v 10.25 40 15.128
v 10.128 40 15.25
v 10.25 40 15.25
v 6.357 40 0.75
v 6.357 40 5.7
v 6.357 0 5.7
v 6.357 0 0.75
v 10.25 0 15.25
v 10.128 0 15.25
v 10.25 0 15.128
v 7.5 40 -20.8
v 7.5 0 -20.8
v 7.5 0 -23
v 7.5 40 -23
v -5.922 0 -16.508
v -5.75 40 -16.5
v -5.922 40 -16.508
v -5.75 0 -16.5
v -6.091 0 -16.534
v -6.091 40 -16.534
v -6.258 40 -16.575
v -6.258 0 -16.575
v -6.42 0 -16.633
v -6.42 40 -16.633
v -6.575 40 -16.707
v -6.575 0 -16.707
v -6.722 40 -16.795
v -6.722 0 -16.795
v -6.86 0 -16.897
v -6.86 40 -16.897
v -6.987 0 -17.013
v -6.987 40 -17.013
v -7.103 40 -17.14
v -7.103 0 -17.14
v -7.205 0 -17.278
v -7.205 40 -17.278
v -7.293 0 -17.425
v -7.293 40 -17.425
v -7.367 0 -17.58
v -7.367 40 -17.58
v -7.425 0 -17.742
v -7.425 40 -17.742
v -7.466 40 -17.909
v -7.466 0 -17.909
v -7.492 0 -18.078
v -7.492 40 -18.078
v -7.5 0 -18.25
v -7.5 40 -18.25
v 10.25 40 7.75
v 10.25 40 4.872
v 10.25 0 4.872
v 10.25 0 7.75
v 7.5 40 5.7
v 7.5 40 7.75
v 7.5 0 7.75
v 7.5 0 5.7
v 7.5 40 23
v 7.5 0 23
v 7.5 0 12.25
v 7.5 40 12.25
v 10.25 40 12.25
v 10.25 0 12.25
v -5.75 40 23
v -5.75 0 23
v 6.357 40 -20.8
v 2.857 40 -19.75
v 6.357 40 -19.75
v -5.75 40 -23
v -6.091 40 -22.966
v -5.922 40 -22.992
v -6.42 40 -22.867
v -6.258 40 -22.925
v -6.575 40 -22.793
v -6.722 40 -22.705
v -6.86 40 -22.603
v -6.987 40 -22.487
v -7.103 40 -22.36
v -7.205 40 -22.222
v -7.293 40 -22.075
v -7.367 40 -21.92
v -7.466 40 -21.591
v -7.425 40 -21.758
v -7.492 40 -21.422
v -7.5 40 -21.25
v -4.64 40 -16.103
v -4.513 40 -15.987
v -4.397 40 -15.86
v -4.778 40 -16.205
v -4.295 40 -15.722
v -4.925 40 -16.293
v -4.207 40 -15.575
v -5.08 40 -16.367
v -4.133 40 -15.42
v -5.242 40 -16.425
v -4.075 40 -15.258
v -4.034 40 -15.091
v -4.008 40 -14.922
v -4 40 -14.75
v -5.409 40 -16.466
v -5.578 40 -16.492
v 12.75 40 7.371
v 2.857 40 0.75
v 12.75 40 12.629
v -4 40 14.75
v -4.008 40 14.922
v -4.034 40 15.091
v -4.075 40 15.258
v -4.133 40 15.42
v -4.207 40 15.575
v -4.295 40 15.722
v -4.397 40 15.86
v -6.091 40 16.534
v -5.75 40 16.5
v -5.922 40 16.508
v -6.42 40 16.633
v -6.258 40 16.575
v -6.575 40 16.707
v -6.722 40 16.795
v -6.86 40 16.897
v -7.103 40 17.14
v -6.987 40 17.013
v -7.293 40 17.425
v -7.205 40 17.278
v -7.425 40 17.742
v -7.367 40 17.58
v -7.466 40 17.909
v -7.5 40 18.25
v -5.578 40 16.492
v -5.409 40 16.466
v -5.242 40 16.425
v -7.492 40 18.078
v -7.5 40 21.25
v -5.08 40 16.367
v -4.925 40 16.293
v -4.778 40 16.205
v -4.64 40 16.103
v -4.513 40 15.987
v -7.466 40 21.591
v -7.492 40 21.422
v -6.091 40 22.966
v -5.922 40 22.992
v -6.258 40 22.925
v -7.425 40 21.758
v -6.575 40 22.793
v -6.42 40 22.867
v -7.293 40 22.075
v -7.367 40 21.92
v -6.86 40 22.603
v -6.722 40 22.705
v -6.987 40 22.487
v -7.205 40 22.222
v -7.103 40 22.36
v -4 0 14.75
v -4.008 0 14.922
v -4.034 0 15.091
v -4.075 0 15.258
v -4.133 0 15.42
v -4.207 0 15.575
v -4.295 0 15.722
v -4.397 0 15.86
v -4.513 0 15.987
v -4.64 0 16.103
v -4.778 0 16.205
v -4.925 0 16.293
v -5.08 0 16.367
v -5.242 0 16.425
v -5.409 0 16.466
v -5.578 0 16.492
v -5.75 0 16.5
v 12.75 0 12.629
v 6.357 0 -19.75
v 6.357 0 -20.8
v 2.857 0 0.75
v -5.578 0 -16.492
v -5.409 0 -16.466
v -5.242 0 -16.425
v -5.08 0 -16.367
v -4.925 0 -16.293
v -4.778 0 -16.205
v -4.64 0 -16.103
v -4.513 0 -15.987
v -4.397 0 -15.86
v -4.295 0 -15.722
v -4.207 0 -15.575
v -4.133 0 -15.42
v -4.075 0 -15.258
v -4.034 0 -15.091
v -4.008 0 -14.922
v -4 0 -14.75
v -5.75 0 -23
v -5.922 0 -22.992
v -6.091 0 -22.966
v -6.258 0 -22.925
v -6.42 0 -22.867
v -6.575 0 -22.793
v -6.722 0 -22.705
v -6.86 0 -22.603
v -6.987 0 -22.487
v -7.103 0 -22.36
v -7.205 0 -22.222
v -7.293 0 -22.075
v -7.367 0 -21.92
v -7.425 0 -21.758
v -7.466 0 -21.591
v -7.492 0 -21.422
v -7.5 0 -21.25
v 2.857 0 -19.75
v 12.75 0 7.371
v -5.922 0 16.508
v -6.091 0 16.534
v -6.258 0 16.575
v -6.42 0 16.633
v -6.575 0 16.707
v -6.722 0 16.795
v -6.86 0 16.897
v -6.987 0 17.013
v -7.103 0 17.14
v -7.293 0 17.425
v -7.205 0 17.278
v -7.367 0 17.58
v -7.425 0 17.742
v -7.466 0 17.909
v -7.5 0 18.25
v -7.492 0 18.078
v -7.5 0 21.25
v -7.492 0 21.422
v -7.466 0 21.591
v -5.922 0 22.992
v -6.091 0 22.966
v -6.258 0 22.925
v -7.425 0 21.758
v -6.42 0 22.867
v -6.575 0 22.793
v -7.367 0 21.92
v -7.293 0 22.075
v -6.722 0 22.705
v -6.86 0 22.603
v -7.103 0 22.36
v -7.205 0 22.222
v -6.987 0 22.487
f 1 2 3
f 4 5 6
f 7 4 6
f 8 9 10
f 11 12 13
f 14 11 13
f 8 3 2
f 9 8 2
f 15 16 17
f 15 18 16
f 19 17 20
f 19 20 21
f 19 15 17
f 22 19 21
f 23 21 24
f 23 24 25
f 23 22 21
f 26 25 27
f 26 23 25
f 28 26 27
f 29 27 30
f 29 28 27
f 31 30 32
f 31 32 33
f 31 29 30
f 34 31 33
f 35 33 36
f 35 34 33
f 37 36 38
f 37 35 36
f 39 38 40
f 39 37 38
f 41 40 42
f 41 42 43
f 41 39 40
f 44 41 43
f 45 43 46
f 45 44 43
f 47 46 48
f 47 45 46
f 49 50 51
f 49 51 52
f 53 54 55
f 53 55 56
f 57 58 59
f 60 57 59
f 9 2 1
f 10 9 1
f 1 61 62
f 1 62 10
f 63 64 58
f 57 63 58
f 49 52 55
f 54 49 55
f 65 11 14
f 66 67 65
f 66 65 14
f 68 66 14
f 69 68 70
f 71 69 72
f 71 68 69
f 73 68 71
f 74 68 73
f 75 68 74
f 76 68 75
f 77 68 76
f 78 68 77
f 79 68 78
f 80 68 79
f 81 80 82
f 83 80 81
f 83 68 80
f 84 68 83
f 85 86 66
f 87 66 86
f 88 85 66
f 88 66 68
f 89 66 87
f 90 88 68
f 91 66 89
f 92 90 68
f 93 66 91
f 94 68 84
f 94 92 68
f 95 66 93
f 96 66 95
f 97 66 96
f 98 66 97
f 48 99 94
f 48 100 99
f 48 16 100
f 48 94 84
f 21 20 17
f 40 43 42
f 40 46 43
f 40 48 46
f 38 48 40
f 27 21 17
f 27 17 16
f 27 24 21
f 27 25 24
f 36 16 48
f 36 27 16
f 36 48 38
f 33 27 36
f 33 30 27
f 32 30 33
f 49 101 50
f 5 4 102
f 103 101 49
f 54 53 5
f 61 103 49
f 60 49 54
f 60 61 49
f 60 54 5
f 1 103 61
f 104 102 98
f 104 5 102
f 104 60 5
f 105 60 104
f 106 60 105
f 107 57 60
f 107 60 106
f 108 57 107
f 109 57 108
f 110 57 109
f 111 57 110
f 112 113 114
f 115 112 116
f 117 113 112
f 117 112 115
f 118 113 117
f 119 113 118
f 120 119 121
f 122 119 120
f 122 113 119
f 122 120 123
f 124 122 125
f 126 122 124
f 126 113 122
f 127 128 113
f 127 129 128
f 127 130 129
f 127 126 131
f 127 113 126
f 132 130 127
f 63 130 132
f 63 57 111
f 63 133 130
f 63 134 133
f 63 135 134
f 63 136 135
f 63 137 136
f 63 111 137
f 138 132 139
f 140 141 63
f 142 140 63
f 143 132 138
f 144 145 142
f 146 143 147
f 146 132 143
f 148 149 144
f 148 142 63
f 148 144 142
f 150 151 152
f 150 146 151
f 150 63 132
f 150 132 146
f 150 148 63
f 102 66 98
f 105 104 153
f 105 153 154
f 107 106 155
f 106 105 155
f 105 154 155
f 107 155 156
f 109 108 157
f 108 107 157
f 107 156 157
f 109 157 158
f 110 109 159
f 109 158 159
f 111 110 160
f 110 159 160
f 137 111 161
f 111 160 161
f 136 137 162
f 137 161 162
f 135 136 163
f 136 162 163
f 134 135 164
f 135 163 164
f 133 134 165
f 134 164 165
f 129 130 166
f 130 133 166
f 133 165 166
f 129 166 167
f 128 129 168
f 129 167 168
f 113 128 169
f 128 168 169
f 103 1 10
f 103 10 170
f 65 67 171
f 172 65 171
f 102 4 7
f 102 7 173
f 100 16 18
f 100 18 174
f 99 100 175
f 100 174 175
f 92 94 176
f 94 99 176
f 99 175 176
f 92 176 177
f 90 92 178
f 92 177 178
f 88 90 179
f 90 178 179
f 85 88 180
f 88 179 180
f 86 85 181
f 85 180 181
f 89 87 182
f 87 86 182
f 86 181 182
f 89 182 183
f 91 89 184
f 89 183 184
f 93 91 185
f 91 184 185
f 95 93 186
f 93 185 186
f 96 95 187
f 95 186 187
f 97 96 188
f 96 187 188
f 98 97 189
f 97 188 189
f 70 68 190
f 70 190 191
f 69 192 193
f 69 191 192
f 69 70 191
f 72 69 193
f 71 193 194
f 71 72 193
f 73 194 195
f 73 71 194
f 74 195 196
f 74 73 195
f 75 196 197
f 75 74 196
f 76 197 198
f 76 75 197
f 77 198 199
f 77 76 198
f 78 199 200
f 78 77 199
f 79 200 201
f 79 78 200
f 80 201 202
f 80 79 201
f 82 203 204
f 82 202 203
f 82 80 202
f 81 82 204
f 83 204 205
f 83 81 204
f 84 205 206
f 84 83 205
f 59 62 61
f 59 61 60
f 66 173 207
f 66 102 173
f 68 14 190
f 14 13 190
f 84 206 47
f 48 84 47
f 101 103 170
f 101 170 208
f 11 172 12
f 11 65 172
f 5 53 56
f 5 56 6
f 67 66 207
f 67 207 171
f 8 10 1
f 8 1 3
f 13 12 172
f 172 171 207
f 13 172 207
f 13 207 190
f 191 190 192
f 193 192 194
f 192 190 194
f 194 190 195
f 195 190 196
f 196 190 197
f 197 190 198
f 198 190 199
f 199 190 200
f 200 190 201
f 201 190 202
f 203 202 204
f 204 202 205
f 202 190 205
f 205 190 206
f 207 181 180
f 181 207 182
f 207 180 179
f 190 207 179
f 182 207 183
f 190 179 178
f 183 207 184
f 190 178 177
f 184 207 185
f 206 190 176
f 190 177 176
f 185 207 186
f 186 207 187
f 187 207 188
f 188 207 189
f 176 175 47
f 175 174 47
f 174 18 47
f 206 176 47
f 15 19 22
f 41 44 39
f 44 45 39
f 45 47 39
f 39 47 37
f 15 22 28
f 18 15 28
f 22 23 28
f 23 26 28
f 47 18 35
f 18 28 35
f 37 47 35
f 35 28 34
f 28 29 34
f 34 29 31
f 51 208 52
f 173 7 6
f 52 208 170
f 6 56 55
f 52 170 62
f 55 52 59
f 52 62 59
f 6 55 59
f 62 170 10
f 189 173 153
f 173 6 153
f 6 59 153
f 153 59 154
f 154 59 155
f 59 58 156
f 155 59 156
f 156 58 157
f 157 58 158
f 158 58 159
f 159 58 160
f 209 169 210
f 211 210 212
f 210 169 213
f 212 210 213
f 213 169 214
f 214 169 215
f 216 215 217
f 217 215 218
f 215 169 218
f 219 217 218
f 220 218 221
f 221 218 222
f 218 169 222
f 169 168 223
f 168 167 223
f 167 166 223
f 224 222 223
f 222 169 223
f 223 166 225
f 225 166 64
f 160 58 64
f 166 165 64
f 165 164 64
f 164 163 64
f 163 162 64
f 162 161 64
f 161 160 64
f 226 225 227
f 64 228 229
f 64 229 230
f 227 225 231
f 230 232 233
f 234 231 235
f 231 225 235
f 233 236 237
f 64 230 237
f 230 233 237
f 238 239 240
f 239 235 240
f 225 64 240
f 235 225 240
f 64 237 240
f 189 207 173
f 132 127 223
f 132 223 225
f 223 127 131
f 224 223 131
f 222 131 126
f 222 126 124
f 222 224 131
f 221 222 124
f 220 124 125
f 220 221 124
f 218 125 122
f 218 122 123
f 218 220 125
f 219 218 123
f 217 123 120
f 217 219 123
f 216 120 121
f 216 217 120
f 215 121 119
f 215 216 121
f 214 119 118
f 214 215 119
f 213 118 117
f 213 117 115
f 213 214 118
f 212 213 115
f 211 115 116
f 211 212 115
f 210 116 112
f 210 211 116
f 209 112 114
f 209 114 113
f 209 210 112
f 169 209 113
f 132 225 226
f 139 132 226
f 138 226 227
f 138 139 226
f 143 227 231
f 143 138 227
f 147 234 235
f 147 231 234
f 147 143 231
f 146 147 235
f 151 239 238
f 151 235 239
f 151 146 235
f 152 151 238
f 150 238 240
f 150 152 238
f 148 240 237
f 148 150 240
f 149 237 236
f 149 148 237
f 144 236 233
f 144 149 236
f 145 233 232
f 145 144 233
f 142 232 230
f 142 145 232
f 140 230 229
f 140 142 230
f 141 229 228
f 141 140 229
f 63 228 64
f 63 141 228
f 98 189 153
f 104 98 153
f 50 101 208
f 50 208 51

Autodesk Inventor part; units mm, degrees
ref_plane "YZ Plane" through (0, 0, 0) normal (1, 0, 0) x (0, 1, 0)
ref_plane "XZ Plane" through (0, 0, 0) normal (0, 1, 0) x (-1, 0, 0)
ref_plane "XY Plane" through (0, 0, 0) normal (0, 0, 1) x (1, 0, 0)
sketch "Sketch1" plane through (0, 0, 0) normal (0, 1, 0) x (-1, 0, 0)
  line L0 (-7.5, -23) -> (7.5, -23)
  line L1 (7.5, -23) -> (7.5, 23)
  line L2 (7.5, 23) -> (-7.5, 23)
  line L3 (-7.5, 23) -> (-7.5, -23)
  line L4 (-7.5, -23) -> (7.5, 23) construction
  line L5 (7.5, -23) -> (-7.5, 23) construction
  point P0 (0, 0)
  dimension "d0" = 15
  dimension "d1" = 46
extrude "Extrusion1" add sketch "Sketch1" along normal blind 40
sketch "Sketch2" plane through (0, 40, 0) normal (0, 1, 0) x (1, 0, 0)
  line L0 (7.5, -23) -> (7.5, 23) projected
  line L1 (7.5, 23) -> (-7.5, 23) projected
  line L2 (7.5, 23) -> (6.9285, 23)
  line L3 (6.9285, 23) -> (6.9285, 7.3)
  line L4 (6.357, 20.3) -> (7.5, 20.3)
  line L5 (7.5, 20.3) -> (7.5, -5.7)
  line L6 (7.5, -5.7) -> (6.357, -5.7)
  line L7 (6.357, -5.7) -> (6.357, 20.3)
  line L8 (6.357, 20.3) -> (7.5, -5.7) construction
  line L9 (7.5, 20.3) -> (6.357, -5.7) construction
  point P0 (7.5, -5.7)
  point P1 (7.5, 20.3)
  dimension "d7" = 0.5715
  dimension "d8" = 15.7
  dimension "d9" = 90
  dimension "d10" = 1.143
  dimension "d11" = 26
extrude "Extrusion2" cut sketch "Sketch2" against normal through all contours L6 L7 L4 L0
sketch "Sketch3" plane through (0, 40, 0) normal (0, 1, 0) x (1, 0, 0)
  line L0 (6.357, -5.7) -> (6.357, 20.3) projected
  line L1 (5.607, 9.5) -> (4.607, 9.5)
  line L2 (2.857, 19.75) -> (6.357, 19.75)
  line L3 (6.357, 19.75) -> (6.357, -0.75)
  line L4 (6.357, -0.75) -> (2.857, -0.75)
  line L5 (2.857, -0.75) -> (2.857, 19.75)
  line L6 (2.857, 19.75) -> (6.357, -0.75) construction
  line L7 (6.357, 19.75) -> (2.857, -0.75) construction
  line L8 (7.5, 23) -> (-7.5, 23) projected
  point P0 (6.357, -0.75)
  point P1 (6.357, 19.75)
  dimension "d51" = 1
  dimension "d53" = 3.5
  dimension "d54" = 20.5
  dimension "d59" = 3.5
  dimension "d60" = 90
  dimension "d61" = 13.5
sketch "Sketch4" plane through (0, 40, 0) normal (0, 1, 0) x (1, 0, 0)
  line L0 (7.5, -23) -> (7.5, -5.7) projected
  line L1 (7.5, -23) -> (7.5, -10)
  line L2 (7.5, -10) -> (9.5, -10)
  line L3 (9.5, -10) -> (9.5, -16)
  line L4 (9.5, -10) -> (9.5, -4)
  line L5 (9.5, -10) -> (13.5, -10)
  line L6 (13.5, -10) -> (13.5, -12.9395)
  line L7 (13.5, -10) -> (13.5, -7.06)
  line L8 (9.5, -16) -> (10.439, -16)
  line L9 (9.5, -4) -> (10.439, -4)
  line L10 (10.439, -4) -> (13.5, -7.06)
  line L11 (13.5, -12.9395) -> (10.439, -16)
  line L12 (9.5, -10) -> (9.5, -13)
  line L13 (9.5, -10) -> (9.5, -7)
  line L14 (9.5, -10) -> (12.5, -10) construction
  line L15 (9.5, -7) -> (7.5, -7)
  line L16 (9.5, -13) -> (7.5, -13)
  line L17 (7.5, -13) -> (7.5, -7)
  line L18 (10.25, -10.95) -> (10.25, -15.25)
  line L19 (10.25, -15.25) -> (10.1284, -15.25)
  line L20 (10.1284, -15.25) -> (12.75, -12.6288)
  line L21 (12.75, -12.6288) -> (12.75, -13)
  line L22 (12.75, -13) -> (12.75, -7.3707)
  line L23 (12.75, -7.3707) -> (10.1284, -4.75)
  line L24 (10.1284, -4.75) -> (10.25, -4.75)
  line L25 (10.25, -4.75) -> (10.25, -10.25)
  line L26 (10.25, -13.1) -> (12.45, -13.1) construction
  line L27 (10.25, -7.5) -> (12.15, -7.5) construction
  line L28 (7.5, -23) -> (7.5, -5.7) projected
  line L29 (10.25, -10.95) -> (10.25, -10.25)
  line L30 (8.5, -13) -> (8.5, -12.25)
  line L31 (8.5, -12.25) -> (10.25, -12.25)
  line L32 (8.5, -12.25) -> (7.5, -12.25)
  line L33 (8.5, -7) -> (8.5, -7.75)
  line L34 (8.5, -7.75) -> (7.5, -7.75)
  line L35 (8.5, -7.75) -> (10.25, -7.75)
  point P0 (0, 0)
  point P1 (9.5, -7)
  point P2 (7.5, -7)
  point P3 (9.5, -7.1)
  point P4 (10.25, -10)
  point P5 (12.75, -10)
  point P6 (10.25, -13)
  point P7 (7.75, -10.75)
  point P8 (10.25, -4.8715)
  point P9 (10.25, -15.1284)
  dimension "d19" = 13
  dimension "d20" = 2
  dimension "d21" = 6
  dimension "d22" = 6
  dimension "d23" = 4
  dimension "d24" = 2.9395
  dimension "d25" = 2.94
  dimension "d26" = 0.939
  dimension "d27" = 0.939
  dimension "d28" = 3
  dimension "d29" = 3
  dimension "d30" = 90
  dimension "d31" = 0.75
  dimension "d32" = 0.75
  dimension "d47" = 0.75
  dimension "d48" = 0.75
extrude "Extrusion5" add sketch "Sketch4" against normal up to surface (40 mm away) contours L0 L2 L3 L31 L32 | L0 L34 L35 L4 L2 | L18 L19 L20 | L5 L25 L29 L18 L31 L3 | L4 L35 L25 L5 | L25 L23 L22 L5 | L5 L22 L20 L18 L29 L25
sketch "Sketch5" plane through (0, 40, 0) normal (0, 1, 0) x (1, 0, 0)
  line L0 (-11, 16.5) -> (-4, 16.5)
  line L1 (-4, 16.5) -> (-4, -16.5)
  line L2 (-4, -16.5) -> (-11, -16.5)
  line L3 (-11, -16.5) -> (-11, 16.5)
  line L4 (-7.5, 23) -> (-7.5, -23) projected
  line L5 (-11, 16.5) -> (-4, -16.5) construction
  line L6 (-4, 16.5) -> (-11, -16.5) construction
  point P0 (0, 0)
  point P1 (-7.5, 0)
  point P2 (-7.5, 16.5)
  point P3 (-7.5, -16.5)
  dimension "d41" = 7
  dimension "d42" = 33
extrude "Extrusion6" cut sketch "Sketch5" against normal through all contours L0 L1 L2 L4
fillet "Fillet1" radius 1.75 4 edges at (-7.5, 20, 16.5) (-7.5, 20, 23) (-7.5, 20, -16.5) (-7.5, 20, -23)
fillet "Fillet2" radius 1.75 2 edges at (-4, 20, -16.5) (-4, 20, 16.5)
move faces "Move3" translate (0, 0, -0.5) faces at (7.119, 26.6667, -20.3)
extrude "Extrusion7" cut sketch "Sketch3" against normal through all
properties part number "Tape_Belt_Layer"
